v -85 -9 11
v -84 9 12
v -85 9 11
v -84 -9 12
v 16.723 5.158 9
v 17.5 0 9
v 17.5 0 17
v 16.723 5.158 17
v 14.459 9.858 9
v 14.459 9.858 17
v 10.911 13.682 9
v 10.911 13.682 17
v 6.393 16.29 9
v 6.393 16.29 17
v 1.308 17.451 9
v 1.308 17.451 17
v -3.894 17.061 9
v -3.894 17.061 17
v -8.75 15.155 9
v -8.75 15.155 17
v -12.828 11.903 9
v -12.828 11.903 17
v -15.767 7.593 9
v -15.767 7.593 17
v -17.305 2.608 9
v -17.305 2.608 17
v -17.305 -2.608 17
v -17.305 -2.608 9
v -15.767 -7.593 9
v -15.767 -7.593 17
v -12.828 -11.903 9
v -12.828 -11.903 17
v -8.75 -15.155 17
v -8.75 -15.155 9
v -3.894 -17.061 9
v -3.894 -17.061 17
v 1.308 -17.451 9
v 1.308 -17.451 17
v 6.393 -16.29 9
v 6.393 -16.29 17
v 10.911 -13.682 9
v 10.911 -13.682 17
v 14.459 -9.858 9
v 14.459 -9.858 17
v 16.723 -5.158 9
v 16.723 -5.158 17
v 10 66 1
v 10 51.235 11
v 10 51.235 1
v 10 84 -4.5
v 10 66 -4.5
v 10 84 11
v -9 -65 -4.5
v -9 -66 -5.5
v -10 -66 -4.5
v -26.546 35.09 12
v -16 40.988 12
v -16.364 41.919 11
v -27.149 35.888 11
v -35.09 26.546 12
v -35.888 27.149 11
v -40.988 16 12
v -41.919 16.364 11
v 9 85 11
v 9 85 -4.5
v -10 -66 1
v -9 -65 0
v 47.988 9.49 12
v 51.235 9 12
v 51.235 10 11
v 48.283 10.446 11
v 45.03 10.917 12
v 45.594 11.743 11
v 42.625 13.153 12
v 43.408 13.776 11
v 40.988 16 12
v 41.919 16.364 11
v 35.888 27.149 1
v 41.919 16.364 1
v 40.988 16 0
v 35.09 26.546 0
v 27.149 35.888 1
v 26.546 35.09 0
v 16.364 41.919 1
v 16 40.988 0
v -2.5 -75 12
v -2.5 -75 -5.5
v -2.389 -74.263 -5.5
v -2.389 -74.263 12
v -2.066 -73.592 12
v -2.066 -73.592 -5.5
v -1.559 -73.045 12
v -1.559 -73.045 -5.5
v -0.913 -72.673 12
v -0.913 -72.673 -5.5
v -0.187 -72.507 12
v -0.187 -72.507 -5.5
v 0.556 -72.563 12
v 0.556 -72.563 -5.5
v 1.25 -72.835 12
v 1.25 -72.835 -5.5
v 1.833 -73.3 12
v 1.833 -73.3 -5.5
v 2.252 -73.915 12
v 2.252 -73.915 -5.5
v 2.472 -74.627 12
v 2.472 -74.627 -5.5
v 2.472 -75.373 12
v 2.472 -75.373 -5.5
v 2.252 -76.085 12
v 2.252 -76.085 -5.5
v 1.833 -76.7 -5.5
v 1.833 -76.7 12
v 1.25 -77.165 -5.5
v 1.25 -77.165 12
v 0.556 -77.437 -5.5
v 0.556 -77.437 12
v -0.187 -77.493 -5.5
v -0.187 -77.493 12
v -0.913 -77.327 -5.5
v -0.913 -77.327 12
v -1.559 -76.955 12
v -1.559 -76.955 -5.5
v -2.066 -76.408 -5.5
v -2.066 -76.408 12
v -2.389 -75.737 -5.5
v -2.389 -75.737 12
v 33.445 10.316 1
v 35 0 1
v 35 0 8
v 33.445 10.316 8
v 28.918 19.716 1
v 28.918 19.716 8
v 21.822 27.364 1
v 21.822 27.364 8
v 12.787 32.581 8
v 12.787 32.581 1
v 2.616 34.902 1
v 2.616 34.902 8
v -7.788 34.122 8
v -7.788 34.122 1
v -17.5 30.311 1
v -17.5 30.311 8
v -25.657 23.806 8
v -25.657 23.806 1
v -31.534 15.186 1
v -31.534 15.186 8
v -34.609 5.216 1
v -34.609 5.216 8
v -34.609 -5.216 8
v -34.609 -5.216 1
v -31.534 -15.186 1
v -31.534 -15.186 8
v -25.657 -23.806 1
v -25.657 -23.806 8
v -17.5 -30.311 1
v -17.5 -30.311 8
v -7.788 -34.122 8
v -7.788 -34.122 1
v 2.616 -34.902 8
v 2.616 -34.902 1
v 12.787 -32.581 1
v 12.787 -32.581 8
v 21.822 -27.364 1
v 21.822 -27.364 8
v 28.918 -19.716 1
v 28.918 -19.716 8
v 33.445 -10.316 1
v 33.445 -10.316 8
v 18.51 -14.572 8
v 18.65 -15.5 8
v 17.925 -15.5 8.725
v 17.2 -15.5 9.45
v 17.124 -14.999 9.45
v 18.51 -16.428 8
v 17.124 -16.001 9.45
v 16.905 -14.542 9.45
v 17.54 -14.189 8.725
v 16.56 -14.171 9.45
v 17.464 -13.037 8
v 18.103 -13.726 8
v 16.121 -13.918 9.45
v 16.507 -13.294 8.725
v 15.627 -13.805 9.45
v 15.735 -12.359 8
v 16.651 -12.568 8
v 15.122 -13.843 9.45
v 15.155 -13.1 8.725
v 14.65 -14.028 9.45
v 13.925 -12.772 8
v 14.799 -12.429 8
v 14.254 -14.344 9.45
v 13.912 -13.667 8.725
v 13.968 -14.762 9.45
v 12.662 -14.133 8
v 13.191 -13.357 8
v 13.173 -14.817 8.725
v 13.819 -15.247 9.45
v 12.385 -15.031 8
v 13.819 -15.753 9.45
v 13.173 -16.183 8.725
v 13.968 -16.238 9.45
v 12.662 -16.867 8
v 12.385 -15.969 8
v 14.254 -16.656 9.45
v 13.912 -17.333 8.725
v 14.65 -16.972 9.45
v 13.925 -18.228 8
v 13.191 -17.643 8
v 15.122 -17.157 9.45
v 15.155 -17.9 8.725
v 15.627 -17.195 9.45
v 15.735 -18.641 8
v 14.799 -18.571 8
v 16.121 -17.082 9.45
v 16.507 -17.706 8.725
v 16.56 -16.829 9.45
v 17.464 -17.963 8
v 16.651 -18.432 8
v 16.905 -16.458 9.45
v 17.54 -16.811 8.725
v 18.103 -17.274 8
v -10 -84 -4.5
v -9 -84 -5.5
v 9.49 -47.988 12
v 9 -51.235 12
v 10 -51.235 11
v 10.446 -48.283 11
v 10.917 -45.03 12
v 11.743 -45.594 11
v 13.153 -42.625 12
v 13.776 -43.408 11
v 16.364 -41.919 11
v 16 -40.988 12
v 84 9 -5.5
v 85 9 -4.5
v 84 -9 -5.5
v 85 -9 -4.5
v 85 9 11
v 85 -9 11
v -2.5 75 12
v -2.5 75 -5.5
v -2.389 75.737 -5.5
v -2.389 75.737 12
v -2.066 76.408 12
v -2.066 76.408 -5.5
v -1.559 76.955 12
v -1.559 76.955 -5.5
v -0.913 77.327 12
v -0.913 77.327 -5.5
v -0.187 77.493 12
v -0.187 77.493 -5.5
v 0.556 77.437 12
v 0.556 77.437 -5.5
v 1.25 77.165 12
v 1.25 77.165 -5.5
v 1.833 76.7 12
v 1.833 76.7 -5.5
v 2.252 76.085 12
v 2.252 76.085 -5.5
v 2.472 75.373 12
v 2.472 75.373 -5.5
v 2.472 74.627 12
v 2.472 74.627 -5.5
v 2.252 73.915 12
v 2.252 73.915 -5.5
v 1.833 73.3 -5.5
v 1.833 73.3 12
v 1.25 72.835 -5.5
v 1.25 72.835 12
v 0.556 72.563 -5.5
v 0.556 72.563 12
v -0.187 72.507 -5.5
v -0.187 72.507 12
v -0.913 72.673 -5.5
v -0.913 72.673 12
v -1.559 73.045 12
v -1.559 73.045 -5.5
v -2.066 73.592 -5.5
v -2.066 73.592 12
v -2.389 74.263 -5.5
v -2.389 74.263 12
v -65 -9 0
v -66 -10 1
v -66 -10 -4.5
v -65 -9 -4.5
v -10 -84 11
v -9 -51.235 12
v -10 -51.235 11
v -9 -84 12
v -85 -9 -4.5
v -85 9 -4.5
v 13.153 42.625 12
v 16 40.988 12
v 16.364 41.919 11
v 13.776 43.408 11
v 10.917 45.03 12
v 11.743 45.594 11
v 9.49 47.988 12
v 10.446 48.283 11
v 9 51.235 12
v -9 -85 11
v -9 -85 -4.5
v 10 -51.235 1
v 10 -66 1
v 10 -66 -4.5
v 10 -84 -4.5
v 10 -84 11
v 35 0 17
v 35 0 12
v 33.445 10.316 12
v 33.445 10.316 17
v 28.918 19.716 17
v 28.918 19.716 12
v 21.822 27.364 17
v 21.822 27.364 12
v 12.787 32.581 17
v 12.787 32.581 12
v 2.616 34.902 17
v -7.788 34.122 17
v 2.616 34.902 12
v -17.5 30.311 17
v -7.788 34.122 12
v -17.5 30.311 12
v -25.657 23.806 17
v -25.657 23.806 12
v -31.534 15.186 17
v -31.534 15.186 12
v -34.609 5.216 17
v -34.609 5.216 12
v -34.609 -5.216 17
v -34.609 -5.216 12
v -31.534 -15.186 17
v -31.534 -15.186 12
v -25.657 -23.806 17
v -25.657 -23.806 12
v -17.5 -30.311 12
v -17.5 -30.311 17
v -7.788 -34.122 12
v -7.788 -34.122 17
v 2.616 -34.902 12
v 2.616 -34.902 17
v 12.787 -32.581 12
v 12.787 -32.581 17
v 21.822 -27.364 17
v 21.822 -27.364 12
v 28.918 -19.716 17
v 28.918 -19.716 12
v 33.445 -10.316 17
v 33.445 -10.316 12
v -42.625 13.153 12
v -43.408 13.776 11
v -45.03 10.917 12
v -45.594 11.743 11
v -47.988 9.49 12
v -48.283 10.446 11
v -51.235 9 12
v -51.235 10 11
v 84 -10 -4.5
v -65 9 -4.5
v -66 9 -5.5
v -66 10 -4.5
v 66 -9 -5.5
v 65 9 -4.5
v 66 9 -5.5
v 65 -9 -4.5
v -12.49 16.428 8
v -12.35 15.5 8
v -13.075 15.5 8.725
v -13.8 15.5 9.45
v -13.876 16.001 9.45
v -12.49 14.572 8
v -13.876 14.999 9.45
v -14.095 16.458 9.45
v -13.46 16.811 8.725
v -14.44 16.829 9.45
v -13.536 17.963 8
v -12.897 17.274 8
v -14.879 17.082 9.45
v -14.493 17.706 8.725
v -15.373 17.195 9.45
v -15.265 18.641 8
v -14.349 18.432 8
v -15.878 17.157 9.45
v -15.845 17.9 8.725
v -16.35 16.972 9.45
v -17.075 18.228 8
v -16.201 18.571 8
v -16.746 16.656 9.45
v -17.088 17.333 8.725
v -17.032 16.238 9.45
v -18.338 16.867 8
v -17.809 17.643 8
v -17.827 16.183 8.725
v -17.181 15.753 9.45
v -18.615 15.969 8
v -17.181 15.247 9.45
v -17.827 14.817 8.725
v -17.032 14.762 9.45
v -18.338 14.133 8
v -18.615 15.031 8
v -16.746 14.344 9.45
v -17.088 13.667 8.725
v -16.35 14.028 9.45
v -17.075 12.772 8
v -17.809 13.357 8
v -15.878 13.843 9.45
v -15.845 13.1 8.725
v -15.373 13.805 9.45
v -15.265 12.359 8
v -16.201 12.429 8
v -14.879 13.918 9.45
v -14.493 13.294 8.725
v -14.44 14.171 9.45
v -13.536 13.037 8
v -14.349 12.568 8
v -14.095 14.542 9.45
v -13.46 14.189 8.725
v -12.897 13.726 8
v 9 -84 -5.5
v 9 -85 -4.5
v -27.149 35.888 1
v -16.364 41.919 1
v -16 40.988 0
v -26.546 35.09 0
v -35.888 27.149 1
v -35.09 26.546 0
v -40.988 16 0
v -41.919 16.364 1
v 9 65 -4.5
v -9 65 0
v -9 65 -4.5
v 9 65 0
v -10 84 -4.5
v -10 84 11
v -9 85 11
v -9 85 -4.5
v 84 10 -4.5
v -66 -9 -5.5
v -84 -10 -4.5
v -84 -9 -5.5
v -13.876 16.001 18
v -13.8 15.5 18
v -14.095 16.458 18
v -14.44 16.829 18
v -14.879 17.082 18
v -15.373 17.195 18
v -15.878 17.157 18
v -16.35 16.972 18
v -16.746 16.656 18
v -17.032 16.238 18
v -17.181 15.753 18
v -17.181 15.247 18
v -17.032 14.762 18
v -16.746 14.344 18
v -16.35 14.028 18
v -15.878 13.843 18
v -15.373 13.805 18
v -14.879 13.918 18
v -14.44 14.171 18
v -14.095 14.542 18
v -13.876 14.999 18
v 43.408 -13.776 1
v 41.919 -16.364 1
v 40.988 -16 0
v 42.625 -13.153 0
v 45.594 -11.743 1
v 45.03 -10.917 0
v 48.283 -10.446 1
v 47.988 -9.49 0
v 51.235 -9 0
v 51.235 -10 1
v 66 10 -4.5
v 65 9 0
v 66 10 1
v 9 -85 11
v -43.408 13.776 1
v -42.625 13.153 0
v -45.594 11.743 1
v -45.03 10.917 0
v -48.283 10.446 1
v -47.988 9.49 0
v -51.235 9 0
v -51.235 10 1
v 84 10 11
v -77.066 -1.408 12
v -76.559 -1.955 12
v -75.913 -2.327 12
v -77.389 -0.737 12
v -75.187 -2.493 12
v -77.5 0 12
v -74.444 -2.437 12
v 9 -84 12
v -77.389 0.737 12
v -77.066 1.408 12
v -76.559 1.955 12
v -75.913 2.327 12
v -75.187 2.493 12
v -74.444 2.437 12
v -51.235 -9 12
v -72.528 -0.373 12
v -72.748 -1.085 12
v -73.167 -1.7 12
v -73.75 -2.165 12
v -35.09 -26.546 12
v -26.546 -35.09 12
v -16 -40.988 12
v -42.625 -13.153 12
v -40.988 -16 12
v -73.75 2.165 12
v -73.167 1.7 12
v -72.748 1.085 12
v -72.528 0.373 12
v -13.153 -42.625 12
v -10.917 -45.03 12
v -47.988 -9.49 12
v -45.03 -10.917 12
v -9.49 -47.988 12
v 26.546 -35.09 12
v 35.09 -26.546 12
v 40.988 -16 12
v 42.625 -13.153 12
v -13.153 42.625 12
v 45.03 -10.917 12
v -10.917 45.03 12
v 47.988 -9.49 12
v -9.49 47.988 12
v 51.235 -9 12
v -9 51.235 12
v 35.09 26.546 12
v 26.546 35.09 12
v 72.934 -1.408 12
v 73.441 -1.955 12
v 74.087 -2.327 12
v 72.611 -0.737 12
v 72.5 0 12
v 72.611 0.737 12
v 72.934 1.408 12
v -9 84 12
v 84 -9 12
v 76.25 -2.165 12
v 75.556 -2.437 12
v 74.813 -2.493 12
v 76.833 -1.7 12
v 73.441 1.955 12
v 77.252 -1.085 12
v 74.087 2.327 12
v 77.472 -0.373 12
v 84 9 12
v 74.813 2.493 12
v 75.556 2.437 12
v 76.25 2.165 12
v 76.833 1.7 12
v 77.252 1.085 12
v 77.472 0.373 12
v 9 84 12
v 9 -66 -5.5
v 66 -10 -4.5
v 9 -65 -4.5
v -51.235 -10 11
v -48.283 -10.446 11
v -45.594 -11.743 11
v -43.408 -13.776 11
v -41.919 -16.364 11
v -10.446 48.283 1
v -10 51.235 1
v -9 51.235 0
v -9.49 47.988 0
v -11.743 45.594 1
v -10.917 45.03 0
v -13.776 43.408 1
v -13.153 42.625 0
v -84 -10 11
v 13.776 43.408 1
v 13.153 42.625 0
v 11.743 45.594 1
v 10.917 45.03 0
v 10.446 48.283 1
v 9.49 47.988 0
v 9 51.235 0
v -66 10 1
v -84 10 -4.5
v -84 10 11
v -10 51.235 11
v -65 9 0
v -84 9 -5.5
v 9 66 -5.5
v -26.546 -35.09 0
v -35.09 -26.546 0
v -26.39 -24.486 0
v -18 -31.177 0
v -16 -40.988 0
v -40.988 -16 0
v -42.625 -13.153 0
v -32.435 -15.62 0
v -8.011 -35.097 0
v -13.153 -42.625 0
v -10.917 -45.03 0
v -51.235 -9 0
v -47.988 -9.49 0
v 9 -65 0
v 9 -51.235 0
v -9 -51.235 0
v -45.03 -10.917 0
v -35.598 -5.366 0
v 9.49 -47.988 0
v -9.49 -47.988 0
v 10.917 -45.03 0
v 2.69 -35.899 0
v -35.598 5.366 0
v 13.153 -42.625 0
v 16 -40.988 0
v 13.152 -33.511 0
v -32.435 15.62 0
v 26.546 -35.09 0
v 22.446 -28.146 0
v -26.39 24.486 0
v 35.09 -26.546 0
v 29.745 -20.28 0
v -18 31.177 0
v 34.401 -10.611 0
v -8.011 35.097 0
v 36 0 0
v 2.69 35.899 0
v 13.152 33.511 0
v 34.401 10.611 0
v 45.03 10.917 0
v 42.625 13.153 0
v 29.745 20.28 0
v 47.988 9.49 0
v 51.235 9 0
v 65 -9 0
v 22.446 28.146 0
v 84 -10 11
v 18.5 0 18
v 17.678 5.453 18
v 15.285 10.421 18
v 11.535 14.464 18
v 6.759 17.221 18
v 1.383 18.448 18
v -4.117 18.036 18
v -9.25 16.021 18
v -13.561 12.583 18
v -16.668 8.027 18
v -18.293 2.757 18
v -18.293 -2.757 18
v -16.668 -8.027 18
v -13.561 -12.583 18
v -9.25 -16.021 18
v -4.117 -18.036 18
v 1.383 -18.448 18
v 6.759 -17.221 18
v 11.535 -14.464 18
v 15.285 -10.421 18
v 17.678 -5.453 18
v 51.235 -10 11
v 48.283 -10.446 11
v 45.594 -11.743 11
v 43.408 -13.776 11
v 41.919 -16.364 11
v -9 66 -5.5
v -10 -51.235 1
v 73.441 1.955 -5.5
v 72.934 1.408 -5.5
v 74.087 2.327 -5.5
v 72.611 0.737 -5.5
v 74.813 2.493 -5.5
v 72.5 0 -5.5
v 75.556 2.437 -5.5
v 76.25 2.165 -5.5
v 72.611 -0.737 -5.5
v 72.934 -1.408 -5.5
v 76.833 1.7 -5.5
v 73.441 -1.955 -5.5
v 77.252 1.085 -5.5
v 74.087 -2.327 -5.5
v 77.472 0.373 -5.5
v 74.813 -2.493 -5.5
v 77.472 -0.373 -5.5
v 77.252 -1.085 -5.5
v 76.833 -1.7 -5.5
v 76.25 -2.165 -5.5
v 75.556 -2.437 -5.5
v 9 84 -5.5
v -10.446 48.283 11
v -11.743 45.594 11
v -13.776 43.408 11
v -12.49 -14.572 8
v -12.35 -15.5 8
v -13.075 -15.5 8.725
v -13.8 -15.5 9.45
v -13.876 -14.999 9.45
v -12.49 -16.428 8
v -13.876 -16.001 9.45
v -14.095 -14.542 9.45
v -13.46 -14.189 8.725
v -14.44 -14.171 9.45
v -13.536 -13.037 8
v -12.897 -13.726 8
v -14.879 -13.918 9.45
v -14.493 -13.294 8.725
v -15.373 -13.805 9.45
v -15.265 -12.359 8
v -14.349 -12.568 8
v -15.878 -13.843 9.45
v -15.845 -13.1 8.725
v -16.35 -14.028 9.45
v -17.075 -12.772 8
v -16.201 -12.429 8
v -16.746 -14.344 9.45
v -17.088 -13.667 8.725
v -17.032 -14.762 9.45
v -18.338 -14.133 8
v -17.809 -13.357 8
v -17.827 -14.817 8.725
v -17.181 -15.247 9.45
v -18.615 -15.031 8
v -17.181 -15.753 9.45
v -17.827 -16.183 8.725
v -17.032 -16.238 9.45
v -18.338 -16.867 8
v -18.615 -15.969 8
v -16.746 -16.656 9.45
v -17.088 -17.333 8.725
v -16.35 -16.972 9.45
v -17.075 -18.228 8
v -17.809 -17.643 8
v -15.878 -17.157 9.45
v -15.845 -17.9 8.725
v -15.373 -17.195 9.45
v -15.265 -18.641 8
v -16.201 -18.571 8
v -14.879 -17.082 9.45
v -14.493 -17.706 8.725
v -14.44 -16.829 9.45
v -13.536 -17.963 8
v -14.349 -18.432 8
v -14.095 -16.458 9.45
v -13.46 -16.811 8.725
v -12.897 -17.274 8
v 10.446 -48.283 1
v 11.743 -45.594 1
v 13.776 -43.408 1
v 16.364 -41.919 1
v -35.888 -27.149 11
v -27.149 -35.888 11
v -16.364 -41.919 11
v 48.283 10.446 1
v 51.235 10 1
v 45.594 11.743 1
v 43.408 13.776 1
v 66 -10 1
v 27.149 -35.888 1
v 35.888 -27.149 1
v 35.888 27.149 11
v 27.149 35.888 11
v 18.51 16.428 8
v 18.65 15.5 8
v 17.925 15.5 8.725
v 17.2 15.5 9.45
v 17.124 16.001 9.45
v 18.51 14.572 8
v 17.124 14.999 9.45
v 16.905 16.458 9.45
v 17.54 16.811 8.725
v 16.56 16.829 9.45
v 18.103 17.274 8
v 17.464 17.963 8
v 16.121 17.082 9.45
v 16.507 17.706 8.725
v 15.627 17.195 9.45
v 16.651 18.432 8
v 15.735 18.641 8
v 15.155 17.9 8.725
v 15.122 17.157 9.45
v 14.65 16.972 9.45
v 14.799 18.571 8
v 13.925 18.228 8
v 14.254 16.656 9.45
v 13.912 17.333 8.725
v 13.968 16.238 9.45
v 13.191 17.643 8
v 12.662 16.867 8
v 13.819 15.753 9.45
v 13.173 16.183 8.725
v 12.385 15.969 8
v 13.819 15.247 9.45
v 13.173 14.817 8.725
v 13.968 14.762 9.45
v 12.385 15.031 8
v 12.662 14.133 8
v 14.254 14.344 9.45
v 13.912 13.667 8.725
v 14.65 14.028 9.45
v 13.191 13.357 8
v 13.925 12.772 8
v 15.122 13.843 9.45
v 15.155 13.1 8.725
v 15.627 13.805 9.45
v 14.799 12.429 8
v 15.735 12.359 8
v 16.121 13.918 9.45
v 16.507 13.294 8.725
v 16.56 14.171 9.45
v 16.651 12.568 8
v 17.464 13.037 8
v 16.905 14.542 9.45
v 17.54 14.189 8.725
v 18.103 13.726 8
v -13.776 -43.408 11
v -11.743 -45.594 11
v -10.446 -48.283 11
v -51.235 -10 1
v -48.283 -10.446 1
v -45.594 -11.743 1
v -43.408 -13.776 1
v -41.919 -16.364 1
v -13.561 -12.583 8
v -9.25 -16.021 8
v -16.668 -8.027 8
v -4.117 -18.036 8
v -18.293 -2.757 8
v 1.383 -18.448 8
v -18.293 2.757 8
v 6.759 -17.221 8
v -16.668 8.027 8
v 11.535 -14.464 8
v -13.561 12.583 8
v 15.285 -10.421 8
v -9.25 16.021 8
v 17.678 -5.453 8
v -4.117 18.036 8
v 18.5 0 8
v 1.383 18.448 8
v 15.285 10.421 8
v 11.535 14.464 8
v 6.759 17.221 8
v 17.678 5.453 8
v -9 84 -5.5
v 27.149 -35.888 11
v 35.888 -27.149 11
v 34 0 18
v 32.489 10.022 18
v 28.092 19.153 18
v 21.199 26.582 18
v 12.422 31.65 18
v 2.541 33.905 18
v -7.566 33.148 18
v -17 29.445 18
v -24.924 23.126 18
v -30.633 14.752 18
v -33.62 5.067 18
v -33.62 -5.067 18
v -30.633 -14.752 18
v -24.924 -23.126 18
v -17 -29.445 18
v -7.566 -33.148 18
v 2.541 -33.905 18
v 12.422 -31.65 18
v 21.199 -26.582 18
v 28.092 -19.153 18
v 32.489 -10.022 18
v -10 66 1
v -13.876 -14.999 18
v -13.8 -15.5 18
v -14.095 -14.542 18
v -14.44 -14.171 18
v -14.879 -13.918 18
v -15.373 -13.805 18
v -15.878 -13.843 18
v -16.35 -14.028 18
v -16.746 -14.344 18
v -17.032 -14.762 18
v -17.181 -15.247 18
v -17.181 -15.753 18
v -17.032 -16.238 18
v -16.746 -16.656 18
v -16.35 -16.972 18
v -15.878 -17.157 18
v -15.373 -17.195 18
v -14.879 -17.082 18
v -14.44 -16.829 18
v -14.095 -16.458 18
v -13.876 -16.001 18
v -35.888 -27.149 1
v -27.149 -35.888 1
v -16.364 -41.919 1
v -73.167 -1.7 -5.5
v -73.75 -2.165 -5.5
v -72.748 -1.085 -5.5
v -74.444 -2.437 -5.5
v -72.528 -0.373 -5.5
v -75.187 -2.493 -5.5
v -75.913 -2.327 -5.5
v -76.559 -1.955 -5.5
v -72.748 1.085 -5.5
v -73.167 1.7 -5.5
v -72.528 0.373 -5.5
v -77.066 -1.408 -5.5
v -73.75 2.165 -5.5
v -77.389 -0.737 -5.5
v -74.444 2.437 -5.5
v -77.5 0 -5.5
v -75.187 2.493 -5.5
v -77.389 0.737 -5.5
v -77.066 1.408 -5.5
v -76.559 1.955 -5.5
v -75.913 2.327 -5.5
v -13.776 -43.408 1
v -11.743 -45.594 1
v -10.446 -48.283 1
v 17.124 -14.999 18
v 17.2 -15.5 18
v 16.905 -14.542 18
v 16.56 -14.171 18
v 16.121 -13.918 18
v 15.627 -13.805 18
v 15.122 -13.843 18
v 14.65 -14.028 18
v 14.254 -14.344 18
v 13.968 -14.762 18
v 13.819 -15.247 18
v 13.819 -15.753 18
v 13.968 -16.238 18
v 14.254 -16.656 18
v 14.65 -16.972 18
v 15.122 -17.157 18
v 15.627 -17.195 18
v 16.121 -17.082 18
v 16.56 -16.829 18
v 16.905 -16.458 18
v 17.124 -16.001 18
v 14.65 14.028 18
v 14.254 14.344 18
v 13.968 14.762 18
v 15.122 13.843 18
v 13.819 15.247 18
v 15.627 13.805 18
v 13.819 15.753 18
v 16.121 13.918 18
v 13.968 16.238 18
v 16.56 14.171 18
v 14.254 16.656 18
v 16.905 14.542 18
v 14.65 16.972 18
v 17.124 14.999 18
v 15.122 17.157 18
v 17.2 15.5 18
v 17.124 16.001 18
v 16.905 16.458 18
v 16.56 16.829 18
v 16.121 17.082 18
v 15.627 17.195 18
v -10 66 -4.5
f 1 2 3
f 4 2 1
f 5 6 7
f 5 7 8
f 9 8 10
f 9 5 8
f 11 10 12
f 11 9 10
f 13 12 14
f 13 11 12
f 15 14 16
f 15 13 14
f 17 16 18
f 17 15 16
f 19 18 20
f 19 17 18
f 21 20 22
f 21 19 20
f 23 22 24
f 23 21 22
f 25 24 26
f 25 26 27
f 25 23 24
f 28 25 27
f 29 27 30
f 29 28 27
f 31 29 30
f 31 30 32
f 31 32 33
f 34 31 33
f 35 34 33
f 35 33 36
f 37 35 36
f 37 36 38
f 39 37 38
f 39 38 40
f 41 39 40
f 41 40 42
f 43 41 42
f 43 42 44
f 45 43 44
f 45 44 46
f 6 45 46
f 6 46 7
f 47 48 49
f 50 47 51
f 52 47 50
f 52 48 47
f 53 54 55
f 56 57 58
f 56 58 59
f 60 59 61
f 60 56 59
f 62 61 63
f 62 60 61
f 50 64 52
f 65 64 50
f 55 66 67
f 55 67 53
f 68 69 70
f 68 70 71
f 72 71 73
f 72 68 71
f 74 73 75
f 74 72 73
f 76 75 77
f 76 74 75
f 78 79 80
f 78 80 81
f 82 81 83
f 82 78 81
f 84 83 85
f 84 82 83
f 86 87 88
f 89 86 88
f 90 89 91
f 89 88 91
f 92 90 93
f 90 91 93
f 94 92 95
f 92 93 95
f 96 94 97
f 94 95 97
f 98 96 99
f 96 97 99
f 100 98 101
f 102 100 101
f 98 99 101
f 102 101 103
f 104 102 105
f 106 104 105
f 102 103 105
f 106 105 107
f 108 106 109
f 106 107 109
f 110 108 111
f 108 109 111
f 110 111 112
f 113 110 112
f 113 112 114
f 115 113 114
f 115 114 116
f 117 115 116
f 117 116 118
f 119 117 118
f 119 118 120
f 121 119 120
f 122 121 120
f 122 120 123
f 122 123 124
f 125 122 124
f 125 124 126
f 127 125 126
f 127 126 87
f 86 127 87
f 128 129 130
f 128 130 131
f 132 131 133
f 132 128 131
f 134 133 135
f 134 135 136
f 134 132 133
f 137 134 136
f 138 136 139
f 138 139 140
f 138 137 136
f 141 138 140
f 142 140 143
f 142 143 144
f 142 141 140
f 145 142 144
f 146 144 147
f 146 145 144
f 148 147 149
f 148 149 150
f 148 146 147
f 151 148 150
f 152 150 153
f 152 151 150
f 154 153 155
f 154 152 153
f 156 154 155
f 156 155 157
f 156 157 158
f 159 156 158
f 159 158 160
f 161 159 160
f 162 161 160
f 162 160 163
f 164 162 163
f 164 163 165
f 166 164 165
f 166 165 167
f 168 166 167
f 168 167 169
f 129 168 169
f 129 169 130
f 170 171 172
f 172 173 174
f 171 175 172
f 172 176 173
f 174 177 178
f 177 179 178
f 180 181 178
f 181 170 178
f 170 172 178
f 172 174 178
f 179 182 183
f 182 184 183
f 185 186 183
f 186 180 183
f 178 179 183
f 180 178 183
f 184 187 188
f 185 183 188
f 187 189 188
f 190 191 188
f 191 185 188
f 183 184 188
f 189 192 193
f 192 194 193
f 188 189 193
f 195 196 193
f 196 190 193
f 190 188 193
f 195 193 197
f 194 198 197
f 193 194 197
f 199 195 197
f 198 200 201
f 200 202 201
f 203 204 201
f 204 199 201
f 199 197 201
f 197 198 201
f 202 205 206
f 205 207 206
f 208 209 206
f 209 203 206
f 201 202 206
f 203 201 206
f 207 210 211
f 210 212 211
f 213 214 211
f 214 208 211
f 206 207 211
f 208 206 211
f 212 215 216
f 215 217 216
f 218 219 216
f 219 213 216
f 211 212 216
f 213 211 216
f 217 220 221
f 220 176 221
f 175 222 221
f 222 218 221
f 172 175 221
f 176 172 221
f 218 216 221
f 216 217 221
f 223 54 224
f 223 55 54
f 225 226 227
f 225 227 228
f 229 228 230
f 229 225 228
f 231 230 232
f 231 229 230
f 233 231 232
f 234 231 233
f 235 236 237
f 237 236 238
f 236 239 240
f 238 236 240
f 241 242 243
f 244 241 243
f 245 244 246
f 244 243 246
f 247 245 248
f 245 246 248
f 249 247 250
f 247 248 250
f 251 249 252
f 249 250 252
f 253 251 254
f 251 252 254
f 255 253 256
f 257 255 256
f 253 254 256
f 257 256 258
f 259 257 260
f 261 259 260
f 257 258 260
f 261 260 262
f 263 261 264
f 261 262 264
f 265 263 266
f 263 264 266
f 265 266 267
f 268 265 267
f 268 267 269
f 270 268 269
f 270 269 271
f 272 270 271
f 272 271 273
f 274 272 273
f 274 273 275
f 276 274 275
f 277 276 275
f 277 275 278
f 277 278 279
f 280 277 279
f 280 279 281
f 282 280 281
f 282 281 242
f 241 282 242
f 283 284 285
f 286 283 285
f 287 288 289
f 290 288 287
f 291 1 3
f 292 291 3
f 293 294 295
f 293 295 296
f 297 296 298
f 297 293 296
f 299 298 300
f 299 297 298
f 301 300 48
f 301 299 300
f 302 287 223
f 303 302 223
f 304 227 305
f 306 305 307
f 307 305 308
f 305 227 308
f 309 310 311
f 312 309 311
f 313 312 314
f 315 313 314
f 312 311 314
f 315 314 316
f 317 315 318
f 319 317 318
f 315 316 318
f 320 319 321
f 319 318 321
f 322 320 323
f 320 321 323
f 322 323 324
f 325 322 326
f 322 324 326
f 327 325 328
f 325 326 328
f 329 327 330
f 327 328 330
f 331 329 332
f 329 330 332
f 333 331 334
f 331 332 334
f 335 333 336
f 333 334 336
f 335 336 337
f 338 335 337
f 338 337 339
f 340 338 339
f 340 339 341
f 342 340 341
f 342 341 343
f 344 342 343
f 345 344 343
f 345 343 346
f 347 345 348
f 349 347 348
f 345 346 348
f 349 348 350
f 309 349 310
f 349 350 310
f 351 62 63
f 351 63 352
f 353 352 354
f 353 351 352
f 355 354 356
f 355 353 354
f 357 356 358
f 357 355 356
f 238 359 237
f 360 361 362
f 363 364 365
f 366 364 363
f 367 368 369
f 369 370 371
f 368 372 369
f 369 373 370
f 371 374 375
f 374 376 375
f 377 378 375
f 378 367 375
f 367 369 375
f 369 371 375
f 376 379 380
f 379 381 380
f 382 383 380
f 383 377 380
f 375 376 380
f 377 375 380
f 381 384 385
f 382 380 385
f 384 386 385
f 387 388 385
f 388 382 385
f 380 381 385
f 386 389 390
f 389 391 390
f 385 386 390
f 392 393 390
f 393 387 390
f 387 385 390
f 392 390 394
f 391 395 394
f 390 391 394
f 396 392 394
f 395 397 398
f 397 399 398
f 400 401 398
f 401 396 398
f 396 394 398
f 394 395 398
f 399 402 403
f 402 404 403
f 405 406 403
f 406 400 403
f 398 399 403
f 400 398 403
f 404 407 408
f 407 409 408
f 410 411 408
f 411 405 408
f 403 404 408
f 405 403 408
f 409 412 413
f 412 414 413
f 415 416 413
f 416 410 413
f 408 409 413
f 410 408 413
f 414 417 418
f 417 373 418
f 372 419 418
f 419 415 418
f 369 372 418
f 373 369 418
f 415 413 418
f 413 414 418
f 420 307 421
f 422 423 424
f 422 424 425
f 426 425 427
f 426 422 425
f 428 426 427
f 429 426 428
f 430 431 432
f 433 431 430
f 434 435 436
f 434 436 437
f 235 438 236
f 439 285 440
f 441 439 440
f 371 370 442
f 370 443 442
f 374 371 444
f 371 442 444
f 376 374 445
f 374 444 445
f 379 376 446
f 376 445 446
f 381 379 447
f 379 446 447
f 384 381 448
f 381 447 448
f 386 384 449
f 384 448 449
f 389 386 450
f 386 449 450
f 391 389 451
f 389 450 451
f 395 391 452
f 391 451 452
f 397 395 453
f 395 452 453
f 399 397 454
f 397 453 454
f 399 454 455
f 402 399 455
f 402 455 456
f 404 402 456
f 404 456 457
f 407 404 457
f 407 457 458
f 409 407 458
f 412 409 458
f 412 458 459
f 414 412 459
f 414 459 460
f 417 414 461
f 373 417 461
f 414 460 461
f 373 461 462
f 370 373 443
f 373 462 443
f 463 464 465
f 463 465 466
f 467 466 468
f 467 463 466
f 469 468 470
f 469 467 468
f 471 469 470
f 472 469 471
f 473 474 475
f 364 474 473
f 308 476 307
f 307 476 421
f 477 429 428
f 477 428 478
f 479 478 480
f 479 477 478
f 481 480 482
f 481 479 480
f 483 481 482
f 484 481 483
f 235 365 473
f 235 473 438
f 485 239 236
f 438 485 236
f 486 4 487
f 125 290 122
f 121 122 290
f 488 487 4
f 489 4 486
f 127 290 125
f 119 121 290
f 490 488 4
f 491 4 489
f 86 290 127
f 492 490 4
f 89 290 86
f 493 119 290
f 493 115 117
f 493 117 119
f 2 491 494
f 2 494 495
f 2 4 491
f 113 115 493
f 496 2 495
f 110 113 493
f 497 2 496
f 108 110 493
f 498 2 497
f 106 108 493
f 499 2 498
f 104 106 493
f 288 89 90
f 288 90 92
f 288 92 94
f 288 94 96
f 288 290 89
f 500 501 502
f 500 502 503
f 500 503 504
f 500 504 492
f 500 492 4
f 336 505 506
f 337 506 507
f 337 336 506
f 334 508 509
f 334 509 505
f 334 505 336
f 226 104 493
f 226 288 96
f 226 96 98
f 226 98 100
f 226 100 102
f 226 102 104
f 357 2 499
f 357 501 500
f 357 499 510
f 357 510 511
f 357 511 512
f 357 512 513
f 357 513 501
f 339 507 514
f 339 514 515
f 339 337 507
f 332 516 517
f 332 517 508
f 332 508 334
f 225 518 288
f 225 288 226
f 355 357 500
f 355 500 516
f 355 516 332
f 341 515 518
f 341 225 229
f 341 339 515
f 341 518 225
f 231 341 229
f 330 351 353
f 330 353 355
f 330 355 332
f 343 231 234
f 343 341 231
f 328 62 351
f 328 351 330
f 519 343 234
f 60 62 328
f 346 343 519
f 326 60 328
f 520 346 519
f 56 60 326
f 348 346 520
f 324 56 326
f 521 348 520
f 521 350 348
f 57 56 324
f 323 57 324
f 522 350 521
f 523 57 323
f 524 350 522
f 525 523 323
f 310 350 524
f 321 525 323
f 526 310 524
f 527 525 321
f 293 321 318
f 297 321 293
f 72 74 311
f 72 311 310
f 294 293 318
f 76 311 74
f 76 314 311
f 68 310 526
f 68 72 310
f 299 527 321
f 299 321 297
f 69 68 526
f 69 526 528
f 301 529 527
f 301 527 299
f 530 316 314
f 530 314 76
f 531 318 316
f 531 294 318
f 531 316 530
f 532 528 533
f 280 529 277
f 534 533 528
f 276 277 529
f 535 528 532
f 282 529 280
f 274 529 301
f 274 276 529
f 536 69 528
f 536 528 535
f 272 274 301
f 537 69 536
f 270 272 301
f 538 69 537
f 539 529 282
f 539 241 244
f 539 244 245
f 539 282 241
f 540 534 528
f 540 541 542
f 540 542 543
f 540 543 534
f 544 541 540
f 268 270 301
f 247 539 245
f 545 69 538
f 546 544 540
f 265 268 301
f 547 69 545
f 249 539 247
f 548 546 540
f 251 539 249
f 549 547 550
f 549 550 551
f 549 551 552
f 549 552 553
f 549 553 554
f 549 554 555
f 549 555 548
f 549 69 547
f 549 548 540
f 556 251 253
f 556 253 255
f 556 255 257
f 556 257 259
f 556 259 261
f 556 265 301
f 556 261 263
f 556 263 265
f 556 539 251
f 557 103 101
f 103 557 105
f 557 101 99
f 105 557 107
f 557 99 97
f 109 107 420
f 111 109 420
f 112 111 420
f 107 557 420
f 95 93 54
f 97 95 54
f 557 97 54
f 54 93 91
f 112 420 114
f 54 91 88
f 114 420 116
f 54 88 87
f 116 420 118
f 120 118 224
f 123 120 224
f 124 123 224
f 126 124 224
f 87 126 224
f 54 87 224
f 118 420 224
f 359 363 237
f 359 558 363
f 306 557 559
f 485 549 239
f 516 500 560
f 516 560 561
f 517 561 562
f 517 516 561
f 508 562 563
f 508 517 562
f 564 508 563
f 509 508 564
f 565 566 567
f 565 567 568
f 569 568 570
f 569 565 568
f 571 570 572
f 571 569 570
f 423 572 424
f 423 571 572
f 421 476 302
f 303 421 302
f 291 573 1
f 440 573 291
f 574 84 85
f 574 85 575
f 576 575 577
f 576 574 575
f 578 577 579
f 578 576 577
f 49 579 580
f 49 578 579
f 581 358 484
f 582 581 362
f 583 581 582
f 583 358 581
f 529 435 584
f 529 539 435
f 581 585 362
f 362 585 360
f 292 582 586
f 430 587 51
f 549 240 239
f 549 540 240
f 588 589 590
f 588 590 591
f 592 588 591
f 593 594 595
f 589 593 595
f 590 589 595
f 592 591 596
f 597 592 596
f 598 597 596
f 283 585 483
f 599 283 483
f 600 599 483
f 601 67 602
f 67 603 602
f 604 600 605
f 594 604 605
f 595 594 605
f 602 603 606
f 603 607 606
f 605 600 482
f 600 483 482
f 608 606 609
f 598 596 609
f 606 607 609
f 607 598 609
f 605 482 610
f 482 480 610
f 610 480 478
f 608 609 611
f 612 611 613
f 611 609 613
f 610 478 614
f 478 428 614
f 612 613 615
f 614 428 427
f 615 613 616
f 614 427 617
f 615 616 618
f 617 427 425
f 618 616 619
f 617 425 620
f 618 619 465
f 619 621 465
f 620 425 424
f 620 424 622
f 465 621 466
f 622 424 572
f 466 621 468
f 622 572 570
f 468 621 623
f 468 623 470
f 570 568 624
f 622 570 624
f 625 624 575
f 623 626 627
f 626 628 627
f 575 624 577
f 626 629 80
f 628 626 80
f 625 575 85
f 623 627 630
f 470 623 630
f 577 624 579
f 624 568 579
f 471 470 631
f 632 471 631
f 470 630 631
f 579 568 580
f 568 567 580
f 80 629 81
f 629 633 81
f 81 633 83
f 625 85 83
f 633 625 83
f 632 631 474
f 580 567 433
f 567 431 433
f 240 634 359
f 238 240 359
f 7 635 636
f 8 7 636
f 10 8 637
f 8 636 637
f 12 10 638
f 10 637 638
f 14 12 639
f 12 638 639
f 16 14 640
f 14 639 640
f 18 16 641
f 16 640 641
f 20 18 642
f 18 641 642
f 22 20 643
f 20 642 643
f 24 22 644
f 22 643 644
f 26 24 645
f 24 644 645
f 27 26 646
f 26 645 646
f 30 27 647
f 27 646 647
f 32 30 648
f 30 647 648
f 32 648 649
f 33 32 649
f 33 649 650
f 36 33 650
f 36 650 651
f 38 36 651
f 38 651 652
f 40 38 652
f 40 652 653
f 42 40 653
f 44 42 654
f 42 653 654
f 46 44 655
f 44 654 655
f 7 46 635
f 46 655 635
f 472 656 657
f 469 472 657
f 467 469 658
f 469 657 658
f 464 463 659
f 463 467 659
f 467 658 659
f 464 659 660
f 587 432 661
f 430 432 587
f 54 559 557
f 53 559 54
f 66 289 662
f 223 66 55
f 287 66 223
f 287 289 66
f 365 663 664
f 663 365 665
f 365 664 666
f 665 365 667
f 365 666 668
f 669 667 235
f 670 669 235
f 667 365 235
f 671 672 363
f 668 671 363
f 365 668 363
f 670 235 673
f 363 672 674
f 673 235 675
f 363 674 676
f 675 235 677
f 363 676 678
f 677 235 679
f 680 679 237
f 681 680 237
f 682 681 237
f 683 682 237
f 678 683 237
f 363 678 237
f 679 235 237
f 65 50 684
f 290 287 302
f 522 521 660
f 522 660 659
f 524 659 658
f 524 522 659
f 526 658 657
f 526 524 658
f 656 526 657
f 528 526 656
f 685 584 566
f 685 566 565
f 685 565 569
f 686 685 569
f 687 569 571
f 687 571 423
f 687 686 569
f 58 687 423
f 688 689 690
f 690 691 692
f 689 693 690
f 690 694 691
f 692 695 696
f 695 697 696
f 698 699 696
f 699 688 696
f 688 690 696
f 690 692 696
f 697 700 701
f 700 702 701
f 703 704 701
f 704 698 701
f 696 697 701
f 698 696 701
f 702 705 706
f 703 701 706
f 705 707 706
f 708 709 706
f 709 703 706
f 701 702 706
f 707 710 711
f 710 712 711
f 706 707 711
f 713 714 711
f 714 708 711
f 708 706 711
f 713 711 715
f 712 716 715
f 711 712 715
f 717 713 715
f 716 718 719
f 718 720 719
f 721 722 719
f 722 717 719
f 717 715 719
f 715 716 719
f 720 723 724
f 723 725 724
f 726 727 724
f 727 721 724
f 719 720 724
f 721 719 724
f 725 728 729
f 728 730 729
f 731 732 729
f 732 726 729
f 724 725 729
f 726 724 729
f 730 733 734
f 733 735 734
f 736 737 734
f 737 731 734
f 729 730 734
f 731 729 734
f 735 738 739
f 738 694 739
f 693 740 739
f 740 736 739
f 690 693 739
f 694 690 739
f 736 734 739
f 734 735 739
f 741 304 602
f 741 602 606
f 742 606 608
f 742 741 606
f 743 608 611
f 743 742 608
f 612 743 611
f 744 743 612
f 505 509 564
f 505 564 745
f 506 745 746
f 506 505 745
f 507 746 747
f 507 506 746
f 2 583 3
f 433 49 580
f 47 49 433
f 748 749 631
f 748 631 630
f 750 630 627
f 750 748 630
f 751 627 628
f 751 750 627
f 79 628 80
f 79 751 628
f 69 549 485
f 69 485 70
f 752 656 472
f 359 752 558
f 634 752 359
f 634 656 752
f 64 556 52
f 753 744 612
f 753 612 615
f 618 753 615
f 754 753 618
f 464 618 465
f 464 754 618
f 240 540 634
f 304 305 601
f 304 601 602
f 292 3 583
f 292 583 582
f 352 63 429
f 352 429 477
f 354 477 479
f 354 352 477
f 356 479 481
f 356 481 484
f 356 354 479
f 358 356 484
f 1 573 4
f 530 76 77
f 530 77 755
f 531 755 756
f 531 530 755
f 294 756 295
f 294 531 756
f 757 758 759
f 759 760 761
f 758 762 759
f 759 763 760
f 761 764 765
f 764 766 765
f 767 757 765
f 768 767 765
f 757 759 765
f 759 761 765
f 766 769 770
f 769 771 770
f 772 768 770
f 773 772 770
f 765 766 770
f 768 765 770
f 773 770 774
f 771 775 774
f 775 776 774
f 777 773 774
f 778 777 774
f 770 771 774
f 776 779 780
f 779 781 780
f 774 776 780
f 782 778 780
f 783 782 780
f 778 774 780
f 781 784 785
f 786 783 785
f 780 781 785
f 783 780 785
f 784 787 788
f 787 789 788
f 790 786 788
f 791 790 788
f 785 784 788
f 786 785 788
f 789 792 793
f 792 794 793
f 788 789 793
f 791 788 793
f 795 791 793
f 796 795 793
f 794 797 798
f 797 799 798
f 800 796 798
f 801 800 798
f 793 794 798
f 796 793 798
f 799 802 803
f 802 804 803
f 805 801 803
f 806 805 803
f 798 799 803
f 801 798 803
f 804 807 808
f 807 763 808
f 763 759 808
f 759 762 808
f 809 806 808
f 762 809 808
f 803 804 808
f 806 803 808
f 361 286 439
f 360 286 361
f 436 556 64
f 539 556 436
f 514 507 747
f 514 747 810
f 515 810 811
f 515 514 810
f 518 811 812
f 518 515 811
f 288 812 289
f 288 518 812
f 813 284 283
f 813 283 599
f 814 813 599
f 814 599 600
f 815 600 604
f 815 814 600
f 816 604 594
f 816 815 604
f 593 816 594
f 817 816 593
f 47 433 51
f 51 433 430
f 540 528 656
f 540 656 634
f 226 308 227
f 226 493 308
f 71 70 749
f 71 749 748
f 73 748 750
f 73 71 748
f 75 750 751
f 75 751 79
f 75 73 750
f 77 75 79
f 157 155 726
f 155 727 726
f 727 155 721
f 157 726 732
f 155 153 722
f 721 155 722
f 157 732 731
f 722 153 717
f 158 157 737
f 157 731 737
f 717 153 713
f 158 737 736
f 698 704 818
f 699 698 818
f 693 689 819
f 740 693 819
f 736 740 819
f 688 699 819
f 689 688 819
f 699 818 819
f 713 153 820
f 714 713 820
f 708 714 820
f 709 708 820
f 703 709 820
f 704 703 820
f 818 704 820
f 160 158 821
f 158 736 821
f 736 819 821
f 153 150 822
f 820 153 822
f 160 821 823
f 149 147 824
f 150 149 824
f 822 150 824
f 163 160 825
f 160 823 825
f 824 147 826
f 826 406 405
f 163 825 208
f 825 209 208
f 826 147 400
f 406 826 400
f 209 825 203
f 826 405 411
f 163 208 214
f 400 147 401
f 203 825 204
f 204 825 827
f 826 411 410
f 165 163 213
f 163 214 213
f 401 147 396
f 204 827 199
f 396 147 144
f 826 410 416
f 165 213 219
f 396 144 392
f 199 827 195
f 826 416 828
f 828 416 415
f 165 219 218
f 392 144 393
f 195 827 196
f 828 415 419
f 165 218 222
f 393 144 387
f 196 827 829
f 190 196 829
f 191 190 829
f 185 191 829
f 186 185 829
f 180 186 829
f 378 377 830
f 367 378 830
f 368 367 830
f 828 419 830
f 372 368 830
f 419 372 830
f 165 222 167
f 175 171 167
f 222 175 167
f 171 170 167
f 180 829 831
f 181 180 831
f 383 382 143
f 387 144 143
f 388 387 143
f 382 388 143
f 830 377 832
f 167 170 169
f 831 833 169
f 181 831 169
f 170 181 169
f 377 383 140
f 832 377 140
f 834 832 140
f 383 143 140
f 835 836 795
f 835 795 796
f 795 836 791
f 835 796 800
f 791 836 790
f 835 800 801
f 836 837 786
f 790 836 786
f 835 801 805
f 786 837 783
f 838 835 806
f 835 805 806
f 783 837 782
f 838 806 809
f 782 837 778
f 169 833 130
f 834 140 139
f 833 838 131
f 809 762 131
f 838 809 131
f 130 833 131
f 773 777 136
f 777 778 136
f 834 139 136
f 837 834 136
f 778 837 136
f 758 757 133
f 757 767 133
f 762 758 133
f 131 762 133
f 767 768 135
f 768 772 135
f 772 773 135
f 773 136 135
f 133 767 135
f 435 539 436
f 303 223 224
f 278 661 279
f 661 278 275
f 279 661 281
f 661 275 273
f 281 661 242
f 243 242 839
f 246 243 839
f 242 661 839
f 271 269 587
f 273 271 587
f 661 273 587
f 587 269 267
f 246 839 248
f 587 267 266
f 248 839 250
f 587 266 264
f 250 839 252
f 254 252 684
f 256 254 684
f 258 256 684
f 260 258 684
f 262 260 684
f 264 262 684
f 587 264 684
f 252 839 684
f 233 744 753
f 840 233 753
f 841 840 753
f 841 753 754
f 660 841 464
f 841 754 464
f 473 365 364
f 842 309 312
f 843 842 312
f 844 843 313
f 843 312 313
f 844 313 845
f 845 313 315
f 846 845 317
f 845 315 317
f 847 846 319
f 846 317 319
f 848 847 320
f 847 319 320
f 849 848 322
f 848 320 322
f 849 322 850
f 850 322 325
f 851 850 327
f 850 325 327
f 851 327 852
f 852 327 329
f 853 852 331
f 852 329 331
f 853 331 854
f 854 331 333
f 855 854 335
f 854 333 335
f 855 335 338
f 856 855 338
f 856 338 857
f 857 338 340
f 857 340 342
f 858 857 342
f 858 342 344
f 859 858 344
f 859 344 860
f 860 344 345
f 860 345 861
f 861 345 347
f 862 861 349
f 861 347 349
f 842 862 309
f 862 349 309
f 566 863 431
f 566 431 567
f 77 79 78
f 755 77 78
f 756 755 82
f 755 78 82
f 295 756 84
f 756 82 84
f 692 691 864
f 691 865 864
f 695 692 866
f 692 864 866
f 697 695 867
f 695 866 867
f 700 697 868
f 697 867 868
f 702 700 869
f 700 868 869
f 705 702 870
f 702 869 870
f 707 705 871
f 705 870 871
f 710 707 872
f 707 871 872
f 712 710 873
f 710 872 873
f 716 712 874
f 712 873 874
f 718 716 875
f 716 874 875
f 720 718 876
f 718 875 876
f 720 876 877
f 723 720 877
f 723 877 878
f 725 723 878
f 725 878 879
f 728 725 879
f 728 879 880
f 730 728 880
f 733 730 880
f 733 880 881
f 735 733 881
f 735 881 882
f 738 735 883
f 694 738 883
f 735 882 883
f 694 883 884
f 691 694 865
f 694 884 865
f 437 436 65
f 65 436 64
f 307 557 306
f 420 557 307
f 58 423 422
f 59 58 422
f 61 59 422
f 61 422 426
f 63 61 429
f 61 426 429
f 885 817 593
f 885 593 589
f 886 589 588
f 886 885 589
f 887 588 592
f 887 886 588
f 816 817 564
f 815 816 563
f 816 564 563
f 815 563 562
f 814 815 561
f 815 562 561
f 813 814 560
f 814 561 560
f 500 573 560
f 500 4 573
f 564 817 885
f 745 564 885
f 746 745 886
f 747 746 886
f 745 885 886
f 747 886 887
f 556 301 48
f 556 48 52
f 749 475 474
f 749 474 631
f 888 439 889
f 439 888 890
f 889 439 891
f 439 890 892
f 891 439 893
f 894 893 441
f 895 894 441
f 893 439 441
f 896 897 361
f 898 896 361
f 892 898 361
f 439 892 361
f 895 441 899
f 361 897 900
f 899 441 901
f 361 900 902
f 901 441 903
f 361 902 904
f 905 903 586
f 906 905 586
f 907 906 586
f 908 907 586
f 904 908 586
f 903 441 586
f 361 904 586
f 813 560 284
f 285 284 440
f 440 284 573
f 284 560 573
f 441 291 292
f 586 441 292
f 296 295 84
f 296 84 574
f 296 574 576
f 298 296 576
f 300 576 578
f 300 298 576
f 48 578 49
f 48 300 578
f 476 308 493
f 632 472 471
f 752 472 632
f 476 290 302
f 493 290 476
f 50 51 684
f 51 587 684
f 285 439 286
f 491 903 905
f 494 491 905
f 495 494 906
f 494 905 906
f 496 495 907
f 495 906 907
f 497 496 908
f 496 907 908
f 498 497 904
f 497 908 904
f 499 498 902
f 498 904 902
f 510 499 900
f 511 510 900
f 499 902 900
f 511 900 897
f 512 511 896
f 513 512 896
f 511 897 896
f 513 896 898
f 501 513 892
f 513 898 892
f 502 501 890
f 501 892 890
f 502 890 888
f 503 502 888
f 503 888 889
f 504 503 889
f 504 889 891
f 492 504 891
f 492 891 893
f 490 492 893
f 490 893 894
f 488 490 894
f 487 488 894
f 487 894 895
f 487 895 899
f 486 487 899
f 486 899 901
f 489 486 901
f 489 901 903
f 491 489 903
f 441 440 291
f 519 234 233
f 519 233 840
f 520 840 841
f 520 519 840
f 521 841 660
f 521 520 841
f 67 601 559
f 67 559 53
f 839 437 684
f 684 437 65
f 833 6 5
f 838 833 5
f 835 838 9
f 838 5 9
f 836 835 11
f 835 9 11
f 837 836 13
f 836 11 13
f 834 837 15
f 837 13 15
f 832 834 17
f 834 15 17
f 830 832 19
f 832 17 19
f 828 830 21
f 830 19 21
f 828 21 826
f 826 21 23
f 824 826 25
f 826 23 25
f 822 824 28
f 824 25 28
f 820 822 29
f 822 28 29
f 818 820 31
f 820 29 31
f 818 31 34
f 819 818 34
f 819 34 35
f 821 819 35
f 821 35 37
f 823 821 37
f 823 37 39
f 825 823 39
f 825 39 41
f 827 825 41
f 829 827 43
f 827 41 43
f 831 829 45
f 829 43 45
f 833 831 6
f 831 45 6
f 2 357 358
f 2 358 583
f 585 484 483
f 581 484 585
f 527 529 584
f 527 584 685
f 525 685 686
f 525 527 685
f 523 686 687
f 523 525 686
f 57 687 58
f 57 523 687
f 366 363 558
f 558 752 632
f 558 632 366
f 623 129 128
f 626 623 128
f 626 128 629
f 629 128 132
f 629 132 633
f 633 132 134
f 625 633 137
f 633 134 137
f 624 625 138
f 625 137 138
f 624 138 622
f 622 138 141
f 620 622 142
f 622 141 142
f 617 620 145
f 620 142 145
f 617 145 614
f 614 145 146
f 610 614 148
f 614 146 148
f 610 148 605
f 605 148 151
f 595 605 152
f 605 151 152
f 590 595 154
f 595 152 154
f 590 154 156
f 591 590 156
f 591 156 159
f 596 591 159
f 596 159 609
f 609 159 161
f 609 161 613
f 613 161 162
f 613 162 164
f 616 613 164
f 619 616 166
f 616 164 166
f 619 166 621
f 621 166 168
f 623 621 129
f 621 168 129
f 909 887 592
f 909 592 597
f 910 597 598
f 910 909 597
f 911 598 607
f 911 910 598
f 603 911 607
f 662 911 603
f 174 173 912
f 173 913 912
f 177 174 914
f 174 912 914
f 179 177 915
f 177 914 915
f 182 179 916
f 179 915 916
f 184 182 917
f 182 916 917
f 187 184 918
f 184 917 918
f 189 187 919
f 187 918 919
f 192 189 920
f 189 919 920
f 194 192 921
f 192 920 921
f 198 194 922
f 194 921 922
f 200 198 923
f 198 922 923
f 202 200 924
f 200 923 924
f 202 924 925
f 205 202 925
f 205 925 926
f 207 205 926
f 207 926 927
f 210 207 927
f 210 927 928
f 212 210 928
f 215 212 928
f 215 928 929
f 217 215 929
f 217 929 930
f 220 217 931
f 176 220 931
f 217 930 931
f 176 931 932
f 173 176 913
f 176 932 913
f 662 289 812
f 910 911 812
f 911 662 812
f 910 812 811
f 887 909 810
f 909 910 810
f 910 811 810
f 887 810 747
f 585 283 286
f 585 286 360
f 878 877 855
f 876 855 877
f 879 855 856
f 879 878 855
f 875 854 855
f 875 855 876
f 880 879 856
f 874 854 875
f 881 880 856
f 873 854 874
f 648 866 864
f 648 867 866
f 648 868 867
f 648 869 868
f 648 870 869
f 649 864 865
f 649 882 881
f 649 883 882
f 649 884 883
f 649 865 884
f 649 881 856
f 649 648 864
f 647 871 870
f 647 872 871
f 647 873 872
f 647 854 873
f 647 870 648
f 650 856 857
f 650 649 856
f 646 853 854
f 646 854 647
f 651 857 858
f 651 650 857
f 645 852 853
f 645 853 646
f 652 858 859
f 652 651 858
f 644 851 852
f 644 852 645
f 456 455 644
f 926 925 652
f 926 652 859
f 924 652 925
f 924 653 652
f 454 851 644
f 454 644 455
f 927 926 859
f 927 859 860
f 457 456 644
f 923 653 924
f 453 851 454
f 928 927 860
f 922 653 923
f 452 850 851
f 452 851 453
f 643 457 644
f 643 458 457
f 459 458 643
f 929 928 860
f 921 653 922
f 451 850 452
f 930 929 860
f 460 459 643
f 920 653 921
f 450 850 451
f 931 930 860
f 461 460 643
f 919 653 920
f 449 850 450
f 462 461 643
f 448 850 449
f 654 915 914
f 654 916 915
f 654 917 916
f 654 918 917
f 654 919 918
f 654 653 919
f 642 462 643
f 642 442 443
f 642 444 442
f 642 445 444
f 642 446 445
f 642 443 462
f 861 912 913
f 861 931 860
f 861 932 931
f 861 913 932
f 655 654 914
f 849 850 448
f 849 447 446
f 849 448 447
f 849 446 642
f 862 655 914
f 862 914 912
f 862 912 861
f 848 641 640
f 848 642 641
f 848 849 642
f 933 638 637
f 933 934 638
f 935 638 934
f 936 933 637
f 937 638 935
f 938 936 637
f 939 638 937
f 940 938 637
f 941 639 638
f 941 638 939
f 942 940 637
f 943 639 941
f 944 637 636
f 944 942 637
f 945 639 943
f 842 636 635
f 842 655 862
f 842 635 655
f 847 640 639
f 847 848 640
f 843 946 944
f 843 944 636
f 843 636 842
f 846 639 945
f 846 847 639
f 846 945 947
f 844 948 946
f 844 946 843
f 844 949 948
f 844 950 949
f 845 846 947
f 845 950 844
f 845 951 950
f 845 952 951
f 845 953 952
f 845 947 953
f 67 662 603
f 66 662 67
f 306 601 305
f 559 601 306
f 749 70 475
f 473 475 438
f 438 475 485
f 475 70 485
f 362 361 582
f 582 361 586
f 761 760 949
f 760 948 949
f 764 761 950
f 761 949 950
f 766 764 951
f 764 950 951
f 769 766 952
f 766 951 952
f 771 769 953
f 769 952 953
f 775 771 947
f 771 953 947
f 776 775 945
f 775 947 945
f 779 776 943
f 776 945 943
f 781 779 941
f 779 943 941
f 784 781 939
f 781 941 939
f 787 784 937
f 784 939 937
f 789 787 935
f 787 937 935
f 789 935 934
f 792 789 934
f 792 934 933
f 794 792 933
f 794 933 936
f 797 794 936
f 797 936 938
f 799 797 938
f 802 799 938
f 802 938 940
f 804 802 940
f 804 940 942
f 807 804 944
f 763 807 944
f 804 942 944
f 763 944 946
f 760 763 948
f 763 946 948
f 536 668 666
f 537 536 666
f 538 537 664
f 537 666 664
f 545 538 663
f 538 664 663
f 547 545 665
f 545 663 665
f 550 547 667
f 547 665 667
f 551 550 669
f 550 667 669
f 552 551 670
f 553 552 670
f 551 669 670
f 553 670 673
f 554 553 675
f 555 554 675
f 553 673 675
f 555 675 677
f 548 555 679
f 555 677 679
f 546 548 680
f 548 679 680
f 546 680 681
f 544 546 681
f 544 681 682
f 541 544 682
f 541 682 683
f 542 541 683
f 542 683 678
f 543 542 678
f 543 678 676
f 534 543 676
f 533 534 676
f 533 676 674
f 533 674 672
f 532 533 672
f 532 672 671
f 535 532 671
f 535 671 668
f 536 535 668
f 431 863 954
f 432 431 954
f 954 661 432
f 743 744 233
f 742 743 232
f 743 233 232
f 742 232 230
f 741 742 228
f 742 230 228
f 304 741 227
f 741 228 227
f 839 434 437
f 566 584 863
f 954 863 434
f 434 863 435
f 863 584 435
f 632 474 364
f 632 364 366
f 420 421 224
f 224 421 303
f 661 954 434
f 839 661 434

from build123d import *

# Parameters (mm, degrees)
SKETCH1_R                                           = 35
BOSS_EXTRUDE1_DEPTH                                 = 12
BOSS_EXTRUDE2_START                                 = -4
SKETCH2_R                                           = 35
SKETCH2_R_2                                         = 17.5
BOSS_EXTRUDE2_DEPTH                                 = 4
SKETCH3_W                                           = 20
SKETCH3_H                                           = 20
BOSS_EXTRUDE3_DEPTH                                 = 5.5
CIRPATTERN1_COUNT                                   = 4
CUT_EXTRUDE1_REACH                                  = 123.475
SKETCH4_R                                           = 2.5
FILLET2_R                                           = 10
SKETCH5_R                                           = 35
SKETCH5_R_2                                         = 17.5
BOSS_EXTRUDE4_DEPTH                                 = 6
CSK_FOR_M3_COUNTERSUNK_FLAT_HEAD_SCREW1_D           = 3.4
CSK_FOR_M3_COUNTERSUNK_FLAT_HEAD_SCREW1_CSINK_D     = 6.3
CSK_FOR_M3_COUNTERSUNK_FLAT_HEAD_SCREW1_CSINK_ANGLE = 90
CHAMFER1_SIZE                                       = 1
CHAMFER2_SIZE                                       = 1


with BuildPart() as part:
    # Sketch1 → Boss-Extrude1 (new body)
    with BuildSketch(Plane.XY):
        with BuildLine():
            Line((43.874821937, -10), (85, -10))
            Line((85, -10), (85, 10))
            Line((85, 10), (43.874821937, 10))
            ThreePointArc((43.874821937, 10), (31.819805153, 31.819805153), (10, 43.874821937))
            Line((10, 43.874821937), (10, 85))
            Line((10, 85), (-10, 85))
            Line((-10, 85), (-10, 43.874821937))
            ThreePointArc((-10, 43.874821937), (-31.819805153, 31.819805153), (-43.874821937, 10))
            Line((-43.874821937, 10), (-85, 10))
            Line((-85, 10), (-85, -10))
            Line((-85, -10), (-43.874821937, -10))
            ThreePointArc((-43.874821937, -10), (-31.819805153, -31.819805153), (-10, -43.874821937))
            Line((-10, -43.874821937), (-10, -85))
            Line((-10, -85), (10, -85))
            Line((10, -85), (10, -43.874821937))
            ThreePointArc((10, -43.874821937), (31.819805153, -31.819805153), (43.874821937, -10))
        make_face()
        Circle(SKETCH1_R, mode=Mode.SUBTRACT)
    extrude(amount=BOSS_EXTRUDE1_DEPTH)

    # Sketch2 → Boss-Extrude2 (add)
    with BuildSketch(Plane.XY.offset(12).offset(BOSS_EXTRUDE2_START)):
        Circle(SKETCH2_R)
        Circle(SKETCH2_R_2, mode=Mode.SUBTRACT)
    extrude(amount=BOSS_EXTRUDE2_DEPTH)

    # Sketch3 → Boss-Extrude3 (add)
    with BuildSketch(Plane.XY):
        with Locations((0, 75)):
            Rectangle(SKETCH3_W, SKETCH3_H)
    boss_extrude3 = extrude(amount=-BOSS_EXTRUDE3_DEPTH)

    # CirPattern1: Boss-Extrude3 ×4 about axis
    cirpattern1_axis = Axis((0, 0, 0), (0, 0, 1))
    for i in range(1, CIRPATTERN1_COUNT):
        add(boss_extrude3.rotate(cirpattern1_axis, i * 360 / CIRPATTERN1_COUNT))

    # Sketch4 → Cut-Extrude1 (cut, up to next)
    with BuildSketch(Plane(origin=(0, 0, -5.5), x_dir=(-1, 0, 0), z_dir=(0, 0, -1)), mode=Mode.PRIVATE) as cut_extrude1_sk1:
        with Locations((0, 75)):
            Circle(SKETCH4_R)
    cut_extrude1_tool1 = extrude(cut_extrude1_sk1.sketch, amount=-CUT_EXTRUDE1_REACH, mode=Mode.PRIVATE) & part.part
    # Sketch4 → Cut-Extrude1 (cut, up to next)
    with BuildSketch(Plane(origin=(0, 0, -5.5), x_dir=(-1, 0, 0), z_dir=(0, 0, -1)), mode=Mode.PRIVATE) as cut_extrude1_sk2:
        with Locations((-75, 0)):
            Circle(SKETCH4_R)
    cut_extrude1_tool2 = extrude(cut_extrude1_sk2.sketch, amount=-CUT_EXTRUDE1_REACH, mode=Mode.PRIVATE) & part.part
    # Sketch4 → Cut-Extrude1 (cut, up to next)
    with BuildSketch(Plane(origin=(0, 0, -5.5), x_dir=(-1, 0, 0), z_dir=(0, 0, -1)), mode=Mode.PRIVATE) as cut_extrude1_sk3:
        with Locations((0, -75)):
            Circle(SKETCH4_R)
    cut_extrude1_tool3 = extrude(cut_extrude1_sk3.sketch, amount=-CUT_EXTRUDE1_REACH, mode=Mode.PRIVATE) & part.part
    # Sketch4 → Cut-Extrude1 (cut, up to next)
    with BuildSketch(Plane(origin=(0, 0, -5.5), x_dir=(-1, 0, 0), z_dir=(0, 0, -1)), mode=Mode.PRIVATE) as cut_extrude1_sk4:
        with Locations((75, 0)):
            Circle(SKETCH4_R)
    cut_extrude1_tool4 = extrude(cut_extrude1_sk4.sketch, amount=-CUT_EXTRUDE1_REACH, mode=Mode.PRIVATE) & part.part
    add(cut_extrude1_tool1.solids().sort_by_distance((0, 75, -5.5))[0], mode=Mode.SUBTRACT)
    add(cut_extrude1_tool2.solids().sort_by_distance((75, 0, -5.5))[0], mode=Mode.SUBTRACT)
    add(cut_extrude1_tool3.solids().sort_by_distance((0, -75, -5.5))[0], mode=Mode.SUBTRACT)
    add(cut_extrude1_tool4.solids().sort_by_distance((-75, 0, -5.5))[0], mode=Mode.SUBTRACT)

    # Fillet2
    fillet2_edges = [part.edges().sort_by_distance(p)[0] for p in [
        (10, -43.874821937, 6),
        (-10, -43.874821937, 6),
        (-43.874821937, -10, 6),
        (-43.874821937, 10, 6),
        (-10, 43.874821937, 6),
        (10, 43.874821937, 6),
        (43.874821937, 10, 6),
        (43.874821937, -10, 6),
    ]]
    fillet(fillet2_edges, radius=FILLET2_R)

    # Sketch5 → Boss-Extrude4 (add)
    with BuildSketch(Plane.XY.offset(12)):
        Circle(SKETCH5_R)
        Circle(SKETCH5_R_2, mode=Mode.SUBTRACT)
    extrude(amount=BOSS_EXTRUDE4_DEPTH)

    # CSK for M3 Countersunk Flat Head Screw1 (through all)
    with Locations(Plane(origin=(-15.5, 15.5, 8), x_dir=(-1, 0, 0), z_dir=(0, 0, -1))):
        with Locations((0, 0), (-31, 0), (-31, -31), (0, -31)):
            CounterSinkHole(CSK_FOR_M3_COUNTERSUNK_FLAT_HEAD_SCREW1_D / 2, CSK_FOR_M3_COUNTERSUNK_FLAT_HEAD_SCREW1_CSINK_D / 2, counter_sink_angle=CSK_FOR_M3_COUNTERSUNK_FLAT_HEAD_SCREW1_CSINK_ANGLE)

    # Chamfer1
    chamfer1_edges = [part.edges().sort_by_distance(p)[0] for p in [
        (85, 0, 12),
        (-58.117376915, 10, 0),
        (-68.117376915, 10, 12),
        (-31.819805153, 31.819805153, 0),
        (-31.819805153, 31.819805153, 12),
        (-31.819805153, -31.819805153, 0),
        (-31.819805153, -31.819805153, 12),
        (68.117376915, 10, 12),
        (-10, -58.117376915, 0),
        (-10, -68.117376915, 12),
        (31.819805153, -31.819805153, 0),
        (31.819805153, -31.819805153, 12),
        (58.117376915, -10, 0),
        (68.117376915, -10, 12),
        (31.819805153, 31.819805153, 0),
        (31.819805153, 31.819805153, 12),
        (10, 58.117376915, 0),
        (10, 68.117376915, 12),
        (-45.593993082, 11.742771762, 0),
        (-45.593993082, 11.742771762, 12),
        (-11.742771762, 45.593993082, 0),
        (-11.742771762, 45.593993082, 12),
        (-45.593993082, -11.742771762, 0),
        (-45.593993082, -11.742771762, 12),
        (-11.742771762, -45.593993082, 0),
        (-11.742771762, -45.593993082, 12),
        (11.742771762, -45.593993082, 0),
        (11.742771762, -45.593993082, 12),
        (45.593993082, -11.742771762, 0),
        (45.593993082, -11.742771762, 12),
        (45.593993082, 11.742771762, 0),
        (45.593993082, 11.742771762, 12),
        (11.742771762, 45.593993082, 0),
        (11.742771762, 45.593993082, 12),
        (0, 85, 12),
        (-10, 68.117376915, 12),
        (10, -85, 3.25),
        (-10, -85, 3.25),
        (-85, -10, 3.25),
        (-85, 10, 3.25),
        (-10, 85, 3.25),
        (10, 85, 3.25),
        (85, 10, 3.25),
        (85, -10, 3.25),
        (-85, 0, 12),
        (-68.117376915, -10, 12),
        (0, -85, 12),
        (10, -68.117376915, 12),
        (-10, 58.117376915, 0),
        (10, 75, -5.5),
        (0, 65, -5.5),
        (10, 65, -2.75),
        (-10, 75, -5.5),
        (-10, 65, -2.75),
        (0, 85, -5.5),
        (58.117376915, 10, 0),
        (75, -10, -5.5),
        (65, 0, -5.5),
        (65, -10, -2.75),
        (75, 10, -5.5),
        (65, 10, -2.75),
        (85, 0, -5.5),
        (10, -58.117376915, 0),
        (-10, -75, -5.5),
        (0, -65, -5.5),
        (-10, -65, -2.75),
        (10, -75, -5.5),
        (10, -65, -2.75),
        (0, -85, -5.5),
        (-58.117376915, -10, 0),
        (-75, 10, -5.5),
        (-65, 0, -5.5),
        (-65, 10, -2.75),
        (-75, -10, -5.5),
        (-65, -10, -2.75),
        (-85, 0, -5.5),
    ]]
    chamfer(chamfer1_edges, length=CHAMFER1_SIZE)

    # Chamfer2
    chamfer2_edges = [part.edges().sort_by_distance(p)[0] for p in [
        (-35, 0, 18),
        (-17.5, 0, 18),
        (-35, 0, 0),
        (-17.5, 0, 8),
    ]]
    chamfer(chamfer2_edges, length=CHAMFER2_SIZE)


solid = part.part
